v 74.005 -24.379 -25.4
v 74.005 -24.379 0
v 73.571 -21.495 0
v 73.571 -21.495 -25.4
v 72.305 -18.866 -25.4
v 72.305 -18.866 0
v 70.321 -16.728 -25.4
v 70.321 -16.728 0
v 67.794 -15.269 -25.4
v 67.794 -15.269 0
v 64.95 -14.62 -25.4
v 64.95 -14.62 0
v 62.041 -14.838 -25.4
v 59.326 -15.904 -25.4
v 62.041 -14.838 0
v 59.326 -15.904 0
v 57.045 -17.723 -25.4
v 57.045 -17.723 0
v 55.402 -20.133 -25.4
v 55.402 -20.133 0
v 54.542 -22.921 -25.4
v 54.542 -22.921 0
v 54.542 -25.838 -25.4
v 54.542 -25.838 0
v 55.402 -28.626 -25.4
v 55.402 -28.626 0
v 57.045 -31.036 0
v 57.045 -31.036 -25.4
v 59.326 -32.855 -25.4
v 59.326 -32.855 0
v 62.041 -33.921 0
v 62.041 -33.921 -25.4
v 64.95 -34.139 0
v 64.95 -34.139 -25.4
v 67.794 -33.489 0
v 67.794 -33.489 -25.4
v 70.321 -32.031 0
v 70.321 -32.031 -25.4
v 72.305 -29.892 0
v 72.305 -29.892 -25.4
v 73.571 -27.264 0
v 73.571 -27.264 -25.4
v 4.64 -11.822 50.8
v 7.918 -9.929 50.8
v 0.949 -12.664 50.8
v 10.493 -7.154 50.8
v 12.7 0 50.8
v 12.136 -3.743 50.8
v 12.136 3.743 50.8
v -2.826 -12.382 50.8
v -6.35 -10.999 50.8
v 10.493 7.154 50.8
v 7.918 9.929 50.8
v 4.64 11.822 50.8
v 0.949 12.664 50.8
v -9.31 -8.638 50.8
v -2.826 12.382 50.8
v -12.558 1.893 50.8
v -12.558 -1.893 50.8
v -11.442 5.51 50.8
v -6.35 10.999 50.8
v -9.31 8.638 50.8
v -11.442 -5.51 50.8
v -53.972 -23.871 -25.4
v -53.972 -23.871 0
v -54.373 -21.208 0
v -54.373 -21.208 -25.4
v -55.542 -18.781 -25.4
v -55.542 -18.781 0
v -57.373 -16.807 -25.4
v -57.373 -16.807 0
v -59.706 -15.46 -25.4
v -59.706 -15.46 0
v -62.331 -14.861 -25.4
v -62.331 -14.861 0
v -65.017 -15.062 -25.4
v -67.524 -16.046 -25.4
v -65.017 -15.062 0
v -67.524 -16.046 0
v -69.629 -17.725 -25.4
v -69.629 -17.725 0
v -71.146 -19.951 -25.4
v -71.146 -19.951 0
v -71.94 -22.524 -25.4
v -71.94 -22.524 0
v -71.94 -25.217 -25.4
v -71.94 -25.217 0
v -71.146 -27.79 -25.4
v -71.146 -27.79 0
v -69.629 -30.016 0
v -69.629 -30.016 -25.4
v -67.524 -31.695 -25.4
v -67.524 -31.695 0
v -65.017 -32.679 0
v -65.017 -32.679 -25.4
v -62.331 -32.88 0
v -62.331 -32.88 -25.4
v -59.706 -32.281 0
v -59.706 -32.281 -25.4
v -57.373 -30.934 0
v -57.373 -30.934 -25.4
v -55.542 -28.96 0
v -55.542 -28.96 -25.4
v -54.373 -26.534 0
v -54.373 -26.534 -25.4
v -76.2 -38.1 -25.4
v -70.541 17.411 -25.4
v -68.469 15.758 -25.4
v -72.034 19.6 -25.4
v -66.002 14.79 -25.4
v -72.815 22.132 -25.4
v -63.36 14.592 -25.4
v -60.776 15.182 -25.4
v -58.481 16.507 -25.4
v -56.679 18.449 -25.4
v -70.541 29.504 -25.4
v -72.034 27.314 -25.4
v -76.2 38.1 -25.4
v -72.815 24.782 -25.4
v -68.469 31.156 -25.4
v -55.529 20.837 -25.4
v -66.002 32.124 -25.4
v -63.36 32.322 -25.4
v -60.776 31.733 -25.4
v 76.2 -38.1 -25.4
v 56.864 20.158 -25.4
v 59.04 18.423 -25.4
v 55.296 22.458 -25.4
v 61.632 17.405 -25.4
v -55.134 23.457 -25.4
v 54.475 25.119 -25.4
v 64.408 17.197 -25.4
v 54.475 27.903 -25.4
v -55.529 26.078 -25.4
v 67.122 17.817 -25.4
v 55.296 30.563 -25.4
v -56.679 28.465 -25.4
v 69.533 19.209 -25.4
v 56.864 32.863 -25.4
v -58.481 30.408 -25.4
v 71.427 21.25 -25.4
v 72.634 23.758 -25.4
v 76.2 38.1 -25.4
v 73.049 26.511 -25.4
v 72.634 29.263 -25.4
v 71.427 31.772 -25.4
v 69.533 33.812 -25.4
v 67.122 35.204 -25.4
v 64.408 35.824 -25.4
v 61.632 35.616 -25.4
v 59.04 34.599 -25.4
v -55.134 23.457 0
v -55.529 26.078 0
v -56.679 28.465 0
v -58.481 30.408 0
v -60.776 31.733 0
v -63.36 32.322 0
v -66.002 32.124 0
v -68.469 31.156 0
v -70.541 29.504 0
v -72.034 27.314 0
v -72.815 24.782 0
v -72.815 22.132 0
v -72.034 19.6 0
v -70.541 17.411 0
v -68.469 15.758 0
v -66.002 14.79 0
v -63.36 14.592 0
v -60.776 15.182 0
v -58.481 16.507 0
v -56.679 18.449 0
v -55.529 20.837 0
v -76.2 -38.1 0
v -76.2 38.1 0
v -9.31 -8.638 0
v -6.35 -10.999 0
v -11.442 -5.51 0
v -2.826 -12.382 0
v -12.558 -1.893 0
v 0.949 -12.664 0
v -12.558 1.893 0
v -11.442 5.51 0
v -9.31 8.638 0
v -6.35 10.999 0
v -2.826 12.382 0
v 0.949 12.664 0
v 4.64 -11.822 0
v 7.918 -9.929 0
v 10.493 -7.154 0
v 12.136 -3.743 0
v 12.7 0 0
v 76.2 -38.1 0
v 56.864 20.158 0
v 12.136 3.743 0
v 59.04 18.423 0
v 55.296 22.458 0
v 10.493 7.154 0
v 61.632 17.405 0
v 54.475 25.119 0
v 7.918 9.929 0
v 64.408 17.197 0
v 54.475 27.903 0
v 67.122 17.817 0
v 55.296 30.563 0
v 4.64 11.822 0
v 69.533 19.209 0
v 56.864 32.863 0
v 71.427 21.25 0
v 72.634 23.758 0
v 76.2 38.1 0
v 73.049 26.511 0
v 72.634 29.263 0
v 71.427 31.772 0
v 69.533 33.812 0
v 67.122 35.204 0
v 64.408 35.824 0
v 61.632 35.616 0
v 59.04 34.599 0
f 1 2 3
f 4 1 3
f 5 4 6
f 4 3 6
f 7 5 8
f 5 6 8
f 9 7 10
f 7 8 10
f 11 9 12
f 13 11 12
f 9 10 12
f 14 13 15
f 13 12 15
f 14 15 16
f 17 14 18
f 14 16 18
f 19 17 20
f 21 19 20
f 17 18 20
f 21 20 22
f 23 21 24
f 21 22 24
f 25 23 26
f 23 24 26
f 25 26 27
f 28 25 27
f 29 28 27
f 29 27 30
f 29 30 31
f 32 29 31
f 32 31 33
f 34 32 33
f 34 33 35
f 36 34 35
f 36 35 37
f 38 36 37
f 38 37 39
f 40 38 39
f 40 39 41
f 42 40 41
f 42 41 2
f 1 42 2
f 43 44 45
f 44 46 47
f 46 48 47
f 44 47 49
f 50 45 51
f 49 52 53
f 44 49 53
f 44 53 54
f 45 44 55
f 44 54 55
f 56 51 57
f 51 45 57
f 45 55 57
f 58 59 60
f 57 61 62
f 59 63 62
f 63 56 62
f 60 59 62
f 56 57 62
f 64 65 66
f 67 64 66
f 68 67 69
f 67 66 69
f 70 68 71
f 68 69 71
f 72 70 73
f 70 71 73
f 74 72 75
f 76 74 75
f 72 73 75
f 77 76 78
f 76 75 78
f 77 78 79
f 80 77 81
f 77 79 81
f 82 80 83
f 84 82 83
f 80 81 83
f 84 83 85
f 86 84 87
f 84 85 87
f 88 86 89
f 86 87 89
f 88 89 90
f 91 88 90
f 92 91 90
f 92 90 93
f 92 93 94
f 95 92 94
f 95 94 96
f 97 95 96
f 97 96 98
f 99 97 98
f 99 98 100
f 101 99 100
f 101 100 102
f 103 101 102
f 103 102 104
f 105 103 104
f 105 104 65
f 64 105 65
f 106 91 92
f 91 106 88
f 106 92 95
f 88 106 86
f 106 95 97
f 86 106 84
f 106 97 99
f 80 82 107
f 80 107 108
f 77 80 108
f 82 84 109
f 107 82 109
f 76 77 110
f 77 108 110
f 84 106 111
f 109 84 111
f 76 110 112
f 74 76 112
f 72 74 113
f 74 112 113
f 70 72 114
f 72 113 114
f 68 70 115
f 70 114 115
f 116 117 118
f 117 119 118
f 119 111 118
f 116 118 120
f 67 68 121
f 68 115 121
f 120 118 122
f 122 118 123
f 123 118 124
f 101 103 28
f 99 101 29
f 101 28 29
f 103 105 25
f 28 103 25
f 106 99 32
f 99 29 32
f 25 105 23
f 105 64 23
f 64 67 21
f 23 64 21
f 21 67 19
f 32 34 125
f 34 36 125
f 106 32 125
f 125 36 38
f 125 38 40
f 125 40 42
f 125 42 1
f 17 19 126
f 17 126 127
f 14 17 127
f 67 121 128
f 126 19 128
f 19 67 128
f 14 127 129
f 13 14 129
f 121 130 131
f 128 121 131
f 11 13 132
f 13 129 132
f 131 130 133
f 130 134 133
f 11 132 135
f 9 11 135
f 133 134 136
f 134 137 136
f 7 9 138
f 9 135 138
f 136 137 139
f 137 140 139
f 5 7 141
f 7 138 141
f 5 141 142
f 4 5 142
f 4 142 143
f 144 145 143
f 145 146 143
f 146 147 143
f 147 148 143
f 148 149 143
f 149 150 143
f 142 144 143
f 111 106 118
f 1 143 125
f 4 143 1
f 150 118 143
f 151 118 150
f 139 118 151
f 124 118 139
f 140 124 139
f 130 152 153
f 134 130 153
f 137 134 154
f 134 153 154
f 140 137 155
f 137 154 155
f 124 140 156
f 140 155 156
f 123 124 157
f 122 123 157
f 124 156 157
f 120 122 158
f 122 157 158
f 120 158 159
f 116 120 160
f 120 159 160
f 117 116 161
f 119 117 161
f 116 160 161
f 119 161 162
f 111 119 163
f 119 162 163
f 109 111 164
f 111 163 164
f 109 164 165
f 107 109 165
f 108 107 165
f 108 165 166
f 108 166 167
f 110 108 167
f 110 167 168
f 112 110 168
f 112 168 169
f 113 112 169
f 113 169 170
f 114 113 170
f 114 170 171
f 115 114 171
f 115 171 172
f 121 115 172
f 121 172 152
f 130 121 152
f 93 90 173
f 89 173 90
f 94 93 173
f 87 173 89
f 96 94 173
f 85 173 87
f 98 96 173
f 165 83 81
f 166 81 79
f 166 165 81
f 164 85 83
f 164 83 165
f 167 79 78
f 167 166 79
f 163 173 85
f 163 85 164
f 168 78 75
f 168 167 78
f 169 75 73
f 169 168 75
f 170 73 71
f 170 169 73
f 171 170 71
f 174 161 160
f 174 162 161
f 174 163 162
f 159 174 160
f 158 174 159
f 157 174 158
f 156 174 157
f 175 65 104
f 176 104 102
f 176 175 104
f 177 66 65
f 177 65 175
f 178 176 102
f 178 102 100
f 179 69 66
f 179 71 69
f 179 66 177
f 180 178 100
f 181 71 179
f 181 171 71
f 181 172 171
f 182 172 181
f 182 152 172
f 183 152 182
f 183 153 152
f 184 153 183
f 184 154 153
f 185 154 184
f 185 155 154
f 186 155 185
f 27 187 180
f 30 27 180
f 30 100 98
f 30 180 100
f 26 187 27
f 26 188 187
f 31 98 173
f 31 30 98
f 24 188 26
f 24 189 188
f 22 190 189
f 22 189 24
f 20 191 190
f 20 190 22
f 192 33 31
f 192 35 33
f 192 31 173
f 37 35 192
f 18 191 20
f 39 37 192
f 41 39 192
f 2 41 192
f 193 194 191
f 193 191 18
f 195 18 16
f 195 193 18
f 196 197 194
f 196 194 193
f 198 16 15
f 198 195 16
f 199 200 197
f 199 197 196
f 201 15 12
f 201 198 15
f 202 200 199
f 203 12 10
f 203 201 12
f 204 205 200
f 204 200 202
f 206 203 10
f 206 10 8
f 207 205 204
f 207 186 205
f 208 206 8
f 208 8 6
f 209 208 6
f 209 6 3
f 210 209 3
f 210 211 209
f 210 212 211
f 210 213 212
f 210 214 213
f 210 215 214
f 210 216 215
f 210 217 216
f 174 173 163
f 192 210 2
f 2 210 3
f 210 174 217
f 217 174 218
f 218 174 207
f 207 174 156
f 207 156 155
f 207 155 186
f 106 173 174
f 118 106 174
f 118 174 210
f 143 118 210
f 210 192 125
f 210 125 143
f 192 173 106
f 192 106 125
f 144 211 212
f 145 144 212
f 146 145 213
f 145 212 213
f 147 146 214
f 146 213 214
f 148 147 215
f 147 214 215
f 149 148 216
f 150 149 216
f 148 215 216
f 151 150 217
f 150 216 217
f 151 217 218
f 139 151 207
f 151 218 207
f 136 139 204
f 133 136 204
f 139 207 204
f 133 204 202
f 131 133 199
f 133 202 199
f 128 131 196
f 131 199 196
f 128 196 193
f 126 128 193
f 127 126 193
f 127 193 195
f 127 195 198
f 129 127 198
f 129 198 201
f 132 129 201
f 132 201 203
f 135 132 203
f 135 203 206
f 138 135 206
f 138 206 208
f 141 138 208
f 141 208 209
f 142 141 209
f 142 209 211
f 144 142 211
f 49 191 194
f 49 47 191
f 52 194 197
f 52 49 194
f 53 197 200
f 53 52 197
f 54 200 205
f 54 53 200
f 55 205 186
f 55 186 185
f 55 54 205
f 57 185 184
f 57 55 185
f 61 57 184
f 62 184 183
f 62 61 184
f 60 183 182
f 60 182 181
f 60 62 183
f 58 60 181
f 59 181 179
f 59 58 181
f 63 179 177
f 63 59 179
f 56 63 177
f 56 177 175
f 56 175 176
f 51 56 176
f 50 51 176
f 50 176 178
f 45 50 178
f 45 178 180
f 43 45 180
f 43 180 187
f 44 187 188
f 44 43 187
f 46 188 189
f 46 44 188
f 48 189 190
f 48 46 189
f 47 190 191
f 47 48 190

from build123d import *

# Parameters (mm, degrees)
F0_W     = 152.4
F0_H     = 76.2
F1_DEPTH = 25.4
F2_R     = 8.89
F2_R_2   = 9.33931
F2_R_3   = 9.03456
F2_R_4   = 9.786488
F3_DEPTH = 50.8
F4_W     = 12.7
F4_H     = 50.8


with BuildPart() as f1:
    # F0 (on Top) → F1 (new body)
    with BuildSketch(Plane.XY):
        Rectangle(F0_W, F0_H)
    extrude(amount=-F1_DEPTH)

    # F2 (on Top) → F3 (cut)
    with BuildSketch(Plane.XY):
        with Locations((-64.024046, 23.457246)):
            Circle(F2_R)
        with Locations((63.710019, 26.510652)):
            Circle(F2_R_2)
        with Locations((-63.006245, -23.870517)):
            Circle(F2_R_3)
        with Locations((64.218916, -24.379414)):
            Circle(F2_R_4)
    extrude(amount=-F3_DEPTH, mode=Mode.SUBTRACT)

    # F4 (on Front) → F5 (revolve)
    with BuildSketch(Plane.XZ):
        with Locations((6.35, 25.4)):
            Rectangle(F4_W, F4_H)
    revolve(axis=Axis((0, 0, 25.4), (0, 0, 1)))


solid = f1.part
